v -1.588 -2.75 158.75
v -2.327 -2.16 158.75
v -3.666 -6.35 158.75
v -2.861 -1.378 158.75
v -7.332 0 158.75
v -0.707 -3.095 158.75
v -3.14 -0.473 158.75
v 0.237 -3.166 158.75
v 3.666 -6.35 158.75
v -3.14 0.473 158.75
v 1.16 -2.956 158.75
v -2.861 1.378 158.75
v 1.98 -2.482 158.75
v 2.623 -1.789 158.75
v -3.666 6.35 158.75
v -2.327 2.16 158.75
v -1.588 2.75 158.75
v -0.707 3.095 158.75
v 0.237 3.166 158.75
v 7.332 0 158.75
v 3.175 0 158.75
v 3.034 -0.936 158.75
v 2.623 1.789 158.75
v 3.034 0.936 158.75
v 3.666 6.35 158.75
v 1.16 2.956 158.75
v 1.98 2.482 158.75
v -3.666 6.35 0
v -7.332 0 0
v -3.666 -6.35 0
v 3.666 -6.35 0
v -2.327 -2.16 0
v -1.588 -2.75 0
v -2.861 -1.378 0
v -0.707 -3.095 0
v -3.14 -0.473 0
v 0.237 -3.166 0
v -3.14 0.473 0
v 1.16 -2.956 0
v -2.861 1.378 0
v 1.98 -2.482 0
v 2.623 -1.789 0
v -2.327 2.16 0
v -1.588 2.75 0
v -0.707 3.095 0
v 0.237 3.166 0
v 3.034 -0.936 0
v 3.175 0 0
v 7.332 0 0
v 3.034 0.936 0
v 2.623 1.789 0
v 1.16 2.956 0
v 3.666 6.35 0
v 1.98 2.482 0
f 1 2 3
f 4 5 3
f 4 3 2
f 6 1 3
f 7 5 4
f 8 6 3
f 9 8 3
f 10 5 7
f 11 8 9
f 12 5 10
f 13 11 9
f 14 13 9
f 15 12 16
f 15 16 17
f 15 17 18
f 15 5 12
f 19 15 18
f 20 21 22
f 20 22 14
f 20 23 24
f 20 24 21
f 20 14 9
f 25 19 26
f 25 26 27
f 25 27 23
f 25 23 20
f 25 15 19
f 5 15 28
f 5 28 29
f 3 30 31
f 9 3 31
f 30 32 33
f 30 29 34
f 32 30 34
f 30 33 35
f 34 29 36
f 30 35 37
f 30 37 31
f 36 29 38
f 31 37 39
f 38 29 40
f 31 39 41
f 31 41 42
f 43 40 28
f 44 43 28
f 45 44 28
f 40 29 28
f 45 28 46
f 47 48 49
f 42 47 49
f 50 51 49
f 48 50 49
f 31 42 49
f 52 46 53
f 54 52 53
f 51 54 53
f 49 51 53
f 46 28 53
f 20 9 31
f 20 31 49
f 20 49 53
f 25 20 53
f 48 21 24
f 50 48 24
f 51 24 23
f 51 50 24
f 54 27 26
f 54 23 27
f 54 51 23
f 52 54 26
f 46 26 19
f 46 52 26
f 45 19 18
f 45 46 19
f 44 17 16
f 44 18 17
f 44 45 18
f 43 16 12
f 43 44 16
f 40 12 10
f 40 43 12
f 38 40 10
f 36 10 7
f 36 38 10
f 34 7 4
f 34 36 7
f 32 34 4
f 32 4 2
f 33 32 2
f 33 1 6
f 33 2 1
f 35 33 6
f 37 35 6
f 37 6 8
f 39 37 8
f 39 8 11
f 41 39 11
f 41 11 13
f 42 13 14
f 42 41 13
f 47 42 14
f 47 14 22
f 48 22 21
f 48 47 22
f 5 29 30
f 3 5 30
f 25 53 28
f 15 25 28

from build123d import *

# Parameters (mm, degrees)
BOSS_EXTRUDE1_DEPTH     = 158.75
CUT_EXTRUDE1_DEPTH      = 160.046057271
CUT_EXTRUDE1_DEPTH_BACK = 160.046057271
SKETCH2_R               = 3.175


with BuildPart() as part:
    # Sketch1 → Boss-Extrude1 (new body)
    with BuildSketch(Plane.XY):
        Polygon((7.332348419, 0), (3.666174209, 6.35), (-3.666174209, 6.35), (-7.332348419, 0), (-3.666174209, -6.35), (3.666174209, -6.35), align=None)
    extrude(amount=BOSS_EXTRUDE1_DEPTH)

    # Sketch2 → Cut-Extrude1 (cut, two sides: drawn at the far end of the back side and taken through both)
    with BuildSketch(Plane.XY.offset(158.75).offset(-CUT_EXTRUDE1_DEPTH_BACK)):
        Circle(SKETCH2_R)
    extrude(amount=CUT_EXTRUDE1_DEPTH + CUT_EXTRUDE1_DEPTH_BACK, mode=Mode.SUBTRACT)


solid = part.part
